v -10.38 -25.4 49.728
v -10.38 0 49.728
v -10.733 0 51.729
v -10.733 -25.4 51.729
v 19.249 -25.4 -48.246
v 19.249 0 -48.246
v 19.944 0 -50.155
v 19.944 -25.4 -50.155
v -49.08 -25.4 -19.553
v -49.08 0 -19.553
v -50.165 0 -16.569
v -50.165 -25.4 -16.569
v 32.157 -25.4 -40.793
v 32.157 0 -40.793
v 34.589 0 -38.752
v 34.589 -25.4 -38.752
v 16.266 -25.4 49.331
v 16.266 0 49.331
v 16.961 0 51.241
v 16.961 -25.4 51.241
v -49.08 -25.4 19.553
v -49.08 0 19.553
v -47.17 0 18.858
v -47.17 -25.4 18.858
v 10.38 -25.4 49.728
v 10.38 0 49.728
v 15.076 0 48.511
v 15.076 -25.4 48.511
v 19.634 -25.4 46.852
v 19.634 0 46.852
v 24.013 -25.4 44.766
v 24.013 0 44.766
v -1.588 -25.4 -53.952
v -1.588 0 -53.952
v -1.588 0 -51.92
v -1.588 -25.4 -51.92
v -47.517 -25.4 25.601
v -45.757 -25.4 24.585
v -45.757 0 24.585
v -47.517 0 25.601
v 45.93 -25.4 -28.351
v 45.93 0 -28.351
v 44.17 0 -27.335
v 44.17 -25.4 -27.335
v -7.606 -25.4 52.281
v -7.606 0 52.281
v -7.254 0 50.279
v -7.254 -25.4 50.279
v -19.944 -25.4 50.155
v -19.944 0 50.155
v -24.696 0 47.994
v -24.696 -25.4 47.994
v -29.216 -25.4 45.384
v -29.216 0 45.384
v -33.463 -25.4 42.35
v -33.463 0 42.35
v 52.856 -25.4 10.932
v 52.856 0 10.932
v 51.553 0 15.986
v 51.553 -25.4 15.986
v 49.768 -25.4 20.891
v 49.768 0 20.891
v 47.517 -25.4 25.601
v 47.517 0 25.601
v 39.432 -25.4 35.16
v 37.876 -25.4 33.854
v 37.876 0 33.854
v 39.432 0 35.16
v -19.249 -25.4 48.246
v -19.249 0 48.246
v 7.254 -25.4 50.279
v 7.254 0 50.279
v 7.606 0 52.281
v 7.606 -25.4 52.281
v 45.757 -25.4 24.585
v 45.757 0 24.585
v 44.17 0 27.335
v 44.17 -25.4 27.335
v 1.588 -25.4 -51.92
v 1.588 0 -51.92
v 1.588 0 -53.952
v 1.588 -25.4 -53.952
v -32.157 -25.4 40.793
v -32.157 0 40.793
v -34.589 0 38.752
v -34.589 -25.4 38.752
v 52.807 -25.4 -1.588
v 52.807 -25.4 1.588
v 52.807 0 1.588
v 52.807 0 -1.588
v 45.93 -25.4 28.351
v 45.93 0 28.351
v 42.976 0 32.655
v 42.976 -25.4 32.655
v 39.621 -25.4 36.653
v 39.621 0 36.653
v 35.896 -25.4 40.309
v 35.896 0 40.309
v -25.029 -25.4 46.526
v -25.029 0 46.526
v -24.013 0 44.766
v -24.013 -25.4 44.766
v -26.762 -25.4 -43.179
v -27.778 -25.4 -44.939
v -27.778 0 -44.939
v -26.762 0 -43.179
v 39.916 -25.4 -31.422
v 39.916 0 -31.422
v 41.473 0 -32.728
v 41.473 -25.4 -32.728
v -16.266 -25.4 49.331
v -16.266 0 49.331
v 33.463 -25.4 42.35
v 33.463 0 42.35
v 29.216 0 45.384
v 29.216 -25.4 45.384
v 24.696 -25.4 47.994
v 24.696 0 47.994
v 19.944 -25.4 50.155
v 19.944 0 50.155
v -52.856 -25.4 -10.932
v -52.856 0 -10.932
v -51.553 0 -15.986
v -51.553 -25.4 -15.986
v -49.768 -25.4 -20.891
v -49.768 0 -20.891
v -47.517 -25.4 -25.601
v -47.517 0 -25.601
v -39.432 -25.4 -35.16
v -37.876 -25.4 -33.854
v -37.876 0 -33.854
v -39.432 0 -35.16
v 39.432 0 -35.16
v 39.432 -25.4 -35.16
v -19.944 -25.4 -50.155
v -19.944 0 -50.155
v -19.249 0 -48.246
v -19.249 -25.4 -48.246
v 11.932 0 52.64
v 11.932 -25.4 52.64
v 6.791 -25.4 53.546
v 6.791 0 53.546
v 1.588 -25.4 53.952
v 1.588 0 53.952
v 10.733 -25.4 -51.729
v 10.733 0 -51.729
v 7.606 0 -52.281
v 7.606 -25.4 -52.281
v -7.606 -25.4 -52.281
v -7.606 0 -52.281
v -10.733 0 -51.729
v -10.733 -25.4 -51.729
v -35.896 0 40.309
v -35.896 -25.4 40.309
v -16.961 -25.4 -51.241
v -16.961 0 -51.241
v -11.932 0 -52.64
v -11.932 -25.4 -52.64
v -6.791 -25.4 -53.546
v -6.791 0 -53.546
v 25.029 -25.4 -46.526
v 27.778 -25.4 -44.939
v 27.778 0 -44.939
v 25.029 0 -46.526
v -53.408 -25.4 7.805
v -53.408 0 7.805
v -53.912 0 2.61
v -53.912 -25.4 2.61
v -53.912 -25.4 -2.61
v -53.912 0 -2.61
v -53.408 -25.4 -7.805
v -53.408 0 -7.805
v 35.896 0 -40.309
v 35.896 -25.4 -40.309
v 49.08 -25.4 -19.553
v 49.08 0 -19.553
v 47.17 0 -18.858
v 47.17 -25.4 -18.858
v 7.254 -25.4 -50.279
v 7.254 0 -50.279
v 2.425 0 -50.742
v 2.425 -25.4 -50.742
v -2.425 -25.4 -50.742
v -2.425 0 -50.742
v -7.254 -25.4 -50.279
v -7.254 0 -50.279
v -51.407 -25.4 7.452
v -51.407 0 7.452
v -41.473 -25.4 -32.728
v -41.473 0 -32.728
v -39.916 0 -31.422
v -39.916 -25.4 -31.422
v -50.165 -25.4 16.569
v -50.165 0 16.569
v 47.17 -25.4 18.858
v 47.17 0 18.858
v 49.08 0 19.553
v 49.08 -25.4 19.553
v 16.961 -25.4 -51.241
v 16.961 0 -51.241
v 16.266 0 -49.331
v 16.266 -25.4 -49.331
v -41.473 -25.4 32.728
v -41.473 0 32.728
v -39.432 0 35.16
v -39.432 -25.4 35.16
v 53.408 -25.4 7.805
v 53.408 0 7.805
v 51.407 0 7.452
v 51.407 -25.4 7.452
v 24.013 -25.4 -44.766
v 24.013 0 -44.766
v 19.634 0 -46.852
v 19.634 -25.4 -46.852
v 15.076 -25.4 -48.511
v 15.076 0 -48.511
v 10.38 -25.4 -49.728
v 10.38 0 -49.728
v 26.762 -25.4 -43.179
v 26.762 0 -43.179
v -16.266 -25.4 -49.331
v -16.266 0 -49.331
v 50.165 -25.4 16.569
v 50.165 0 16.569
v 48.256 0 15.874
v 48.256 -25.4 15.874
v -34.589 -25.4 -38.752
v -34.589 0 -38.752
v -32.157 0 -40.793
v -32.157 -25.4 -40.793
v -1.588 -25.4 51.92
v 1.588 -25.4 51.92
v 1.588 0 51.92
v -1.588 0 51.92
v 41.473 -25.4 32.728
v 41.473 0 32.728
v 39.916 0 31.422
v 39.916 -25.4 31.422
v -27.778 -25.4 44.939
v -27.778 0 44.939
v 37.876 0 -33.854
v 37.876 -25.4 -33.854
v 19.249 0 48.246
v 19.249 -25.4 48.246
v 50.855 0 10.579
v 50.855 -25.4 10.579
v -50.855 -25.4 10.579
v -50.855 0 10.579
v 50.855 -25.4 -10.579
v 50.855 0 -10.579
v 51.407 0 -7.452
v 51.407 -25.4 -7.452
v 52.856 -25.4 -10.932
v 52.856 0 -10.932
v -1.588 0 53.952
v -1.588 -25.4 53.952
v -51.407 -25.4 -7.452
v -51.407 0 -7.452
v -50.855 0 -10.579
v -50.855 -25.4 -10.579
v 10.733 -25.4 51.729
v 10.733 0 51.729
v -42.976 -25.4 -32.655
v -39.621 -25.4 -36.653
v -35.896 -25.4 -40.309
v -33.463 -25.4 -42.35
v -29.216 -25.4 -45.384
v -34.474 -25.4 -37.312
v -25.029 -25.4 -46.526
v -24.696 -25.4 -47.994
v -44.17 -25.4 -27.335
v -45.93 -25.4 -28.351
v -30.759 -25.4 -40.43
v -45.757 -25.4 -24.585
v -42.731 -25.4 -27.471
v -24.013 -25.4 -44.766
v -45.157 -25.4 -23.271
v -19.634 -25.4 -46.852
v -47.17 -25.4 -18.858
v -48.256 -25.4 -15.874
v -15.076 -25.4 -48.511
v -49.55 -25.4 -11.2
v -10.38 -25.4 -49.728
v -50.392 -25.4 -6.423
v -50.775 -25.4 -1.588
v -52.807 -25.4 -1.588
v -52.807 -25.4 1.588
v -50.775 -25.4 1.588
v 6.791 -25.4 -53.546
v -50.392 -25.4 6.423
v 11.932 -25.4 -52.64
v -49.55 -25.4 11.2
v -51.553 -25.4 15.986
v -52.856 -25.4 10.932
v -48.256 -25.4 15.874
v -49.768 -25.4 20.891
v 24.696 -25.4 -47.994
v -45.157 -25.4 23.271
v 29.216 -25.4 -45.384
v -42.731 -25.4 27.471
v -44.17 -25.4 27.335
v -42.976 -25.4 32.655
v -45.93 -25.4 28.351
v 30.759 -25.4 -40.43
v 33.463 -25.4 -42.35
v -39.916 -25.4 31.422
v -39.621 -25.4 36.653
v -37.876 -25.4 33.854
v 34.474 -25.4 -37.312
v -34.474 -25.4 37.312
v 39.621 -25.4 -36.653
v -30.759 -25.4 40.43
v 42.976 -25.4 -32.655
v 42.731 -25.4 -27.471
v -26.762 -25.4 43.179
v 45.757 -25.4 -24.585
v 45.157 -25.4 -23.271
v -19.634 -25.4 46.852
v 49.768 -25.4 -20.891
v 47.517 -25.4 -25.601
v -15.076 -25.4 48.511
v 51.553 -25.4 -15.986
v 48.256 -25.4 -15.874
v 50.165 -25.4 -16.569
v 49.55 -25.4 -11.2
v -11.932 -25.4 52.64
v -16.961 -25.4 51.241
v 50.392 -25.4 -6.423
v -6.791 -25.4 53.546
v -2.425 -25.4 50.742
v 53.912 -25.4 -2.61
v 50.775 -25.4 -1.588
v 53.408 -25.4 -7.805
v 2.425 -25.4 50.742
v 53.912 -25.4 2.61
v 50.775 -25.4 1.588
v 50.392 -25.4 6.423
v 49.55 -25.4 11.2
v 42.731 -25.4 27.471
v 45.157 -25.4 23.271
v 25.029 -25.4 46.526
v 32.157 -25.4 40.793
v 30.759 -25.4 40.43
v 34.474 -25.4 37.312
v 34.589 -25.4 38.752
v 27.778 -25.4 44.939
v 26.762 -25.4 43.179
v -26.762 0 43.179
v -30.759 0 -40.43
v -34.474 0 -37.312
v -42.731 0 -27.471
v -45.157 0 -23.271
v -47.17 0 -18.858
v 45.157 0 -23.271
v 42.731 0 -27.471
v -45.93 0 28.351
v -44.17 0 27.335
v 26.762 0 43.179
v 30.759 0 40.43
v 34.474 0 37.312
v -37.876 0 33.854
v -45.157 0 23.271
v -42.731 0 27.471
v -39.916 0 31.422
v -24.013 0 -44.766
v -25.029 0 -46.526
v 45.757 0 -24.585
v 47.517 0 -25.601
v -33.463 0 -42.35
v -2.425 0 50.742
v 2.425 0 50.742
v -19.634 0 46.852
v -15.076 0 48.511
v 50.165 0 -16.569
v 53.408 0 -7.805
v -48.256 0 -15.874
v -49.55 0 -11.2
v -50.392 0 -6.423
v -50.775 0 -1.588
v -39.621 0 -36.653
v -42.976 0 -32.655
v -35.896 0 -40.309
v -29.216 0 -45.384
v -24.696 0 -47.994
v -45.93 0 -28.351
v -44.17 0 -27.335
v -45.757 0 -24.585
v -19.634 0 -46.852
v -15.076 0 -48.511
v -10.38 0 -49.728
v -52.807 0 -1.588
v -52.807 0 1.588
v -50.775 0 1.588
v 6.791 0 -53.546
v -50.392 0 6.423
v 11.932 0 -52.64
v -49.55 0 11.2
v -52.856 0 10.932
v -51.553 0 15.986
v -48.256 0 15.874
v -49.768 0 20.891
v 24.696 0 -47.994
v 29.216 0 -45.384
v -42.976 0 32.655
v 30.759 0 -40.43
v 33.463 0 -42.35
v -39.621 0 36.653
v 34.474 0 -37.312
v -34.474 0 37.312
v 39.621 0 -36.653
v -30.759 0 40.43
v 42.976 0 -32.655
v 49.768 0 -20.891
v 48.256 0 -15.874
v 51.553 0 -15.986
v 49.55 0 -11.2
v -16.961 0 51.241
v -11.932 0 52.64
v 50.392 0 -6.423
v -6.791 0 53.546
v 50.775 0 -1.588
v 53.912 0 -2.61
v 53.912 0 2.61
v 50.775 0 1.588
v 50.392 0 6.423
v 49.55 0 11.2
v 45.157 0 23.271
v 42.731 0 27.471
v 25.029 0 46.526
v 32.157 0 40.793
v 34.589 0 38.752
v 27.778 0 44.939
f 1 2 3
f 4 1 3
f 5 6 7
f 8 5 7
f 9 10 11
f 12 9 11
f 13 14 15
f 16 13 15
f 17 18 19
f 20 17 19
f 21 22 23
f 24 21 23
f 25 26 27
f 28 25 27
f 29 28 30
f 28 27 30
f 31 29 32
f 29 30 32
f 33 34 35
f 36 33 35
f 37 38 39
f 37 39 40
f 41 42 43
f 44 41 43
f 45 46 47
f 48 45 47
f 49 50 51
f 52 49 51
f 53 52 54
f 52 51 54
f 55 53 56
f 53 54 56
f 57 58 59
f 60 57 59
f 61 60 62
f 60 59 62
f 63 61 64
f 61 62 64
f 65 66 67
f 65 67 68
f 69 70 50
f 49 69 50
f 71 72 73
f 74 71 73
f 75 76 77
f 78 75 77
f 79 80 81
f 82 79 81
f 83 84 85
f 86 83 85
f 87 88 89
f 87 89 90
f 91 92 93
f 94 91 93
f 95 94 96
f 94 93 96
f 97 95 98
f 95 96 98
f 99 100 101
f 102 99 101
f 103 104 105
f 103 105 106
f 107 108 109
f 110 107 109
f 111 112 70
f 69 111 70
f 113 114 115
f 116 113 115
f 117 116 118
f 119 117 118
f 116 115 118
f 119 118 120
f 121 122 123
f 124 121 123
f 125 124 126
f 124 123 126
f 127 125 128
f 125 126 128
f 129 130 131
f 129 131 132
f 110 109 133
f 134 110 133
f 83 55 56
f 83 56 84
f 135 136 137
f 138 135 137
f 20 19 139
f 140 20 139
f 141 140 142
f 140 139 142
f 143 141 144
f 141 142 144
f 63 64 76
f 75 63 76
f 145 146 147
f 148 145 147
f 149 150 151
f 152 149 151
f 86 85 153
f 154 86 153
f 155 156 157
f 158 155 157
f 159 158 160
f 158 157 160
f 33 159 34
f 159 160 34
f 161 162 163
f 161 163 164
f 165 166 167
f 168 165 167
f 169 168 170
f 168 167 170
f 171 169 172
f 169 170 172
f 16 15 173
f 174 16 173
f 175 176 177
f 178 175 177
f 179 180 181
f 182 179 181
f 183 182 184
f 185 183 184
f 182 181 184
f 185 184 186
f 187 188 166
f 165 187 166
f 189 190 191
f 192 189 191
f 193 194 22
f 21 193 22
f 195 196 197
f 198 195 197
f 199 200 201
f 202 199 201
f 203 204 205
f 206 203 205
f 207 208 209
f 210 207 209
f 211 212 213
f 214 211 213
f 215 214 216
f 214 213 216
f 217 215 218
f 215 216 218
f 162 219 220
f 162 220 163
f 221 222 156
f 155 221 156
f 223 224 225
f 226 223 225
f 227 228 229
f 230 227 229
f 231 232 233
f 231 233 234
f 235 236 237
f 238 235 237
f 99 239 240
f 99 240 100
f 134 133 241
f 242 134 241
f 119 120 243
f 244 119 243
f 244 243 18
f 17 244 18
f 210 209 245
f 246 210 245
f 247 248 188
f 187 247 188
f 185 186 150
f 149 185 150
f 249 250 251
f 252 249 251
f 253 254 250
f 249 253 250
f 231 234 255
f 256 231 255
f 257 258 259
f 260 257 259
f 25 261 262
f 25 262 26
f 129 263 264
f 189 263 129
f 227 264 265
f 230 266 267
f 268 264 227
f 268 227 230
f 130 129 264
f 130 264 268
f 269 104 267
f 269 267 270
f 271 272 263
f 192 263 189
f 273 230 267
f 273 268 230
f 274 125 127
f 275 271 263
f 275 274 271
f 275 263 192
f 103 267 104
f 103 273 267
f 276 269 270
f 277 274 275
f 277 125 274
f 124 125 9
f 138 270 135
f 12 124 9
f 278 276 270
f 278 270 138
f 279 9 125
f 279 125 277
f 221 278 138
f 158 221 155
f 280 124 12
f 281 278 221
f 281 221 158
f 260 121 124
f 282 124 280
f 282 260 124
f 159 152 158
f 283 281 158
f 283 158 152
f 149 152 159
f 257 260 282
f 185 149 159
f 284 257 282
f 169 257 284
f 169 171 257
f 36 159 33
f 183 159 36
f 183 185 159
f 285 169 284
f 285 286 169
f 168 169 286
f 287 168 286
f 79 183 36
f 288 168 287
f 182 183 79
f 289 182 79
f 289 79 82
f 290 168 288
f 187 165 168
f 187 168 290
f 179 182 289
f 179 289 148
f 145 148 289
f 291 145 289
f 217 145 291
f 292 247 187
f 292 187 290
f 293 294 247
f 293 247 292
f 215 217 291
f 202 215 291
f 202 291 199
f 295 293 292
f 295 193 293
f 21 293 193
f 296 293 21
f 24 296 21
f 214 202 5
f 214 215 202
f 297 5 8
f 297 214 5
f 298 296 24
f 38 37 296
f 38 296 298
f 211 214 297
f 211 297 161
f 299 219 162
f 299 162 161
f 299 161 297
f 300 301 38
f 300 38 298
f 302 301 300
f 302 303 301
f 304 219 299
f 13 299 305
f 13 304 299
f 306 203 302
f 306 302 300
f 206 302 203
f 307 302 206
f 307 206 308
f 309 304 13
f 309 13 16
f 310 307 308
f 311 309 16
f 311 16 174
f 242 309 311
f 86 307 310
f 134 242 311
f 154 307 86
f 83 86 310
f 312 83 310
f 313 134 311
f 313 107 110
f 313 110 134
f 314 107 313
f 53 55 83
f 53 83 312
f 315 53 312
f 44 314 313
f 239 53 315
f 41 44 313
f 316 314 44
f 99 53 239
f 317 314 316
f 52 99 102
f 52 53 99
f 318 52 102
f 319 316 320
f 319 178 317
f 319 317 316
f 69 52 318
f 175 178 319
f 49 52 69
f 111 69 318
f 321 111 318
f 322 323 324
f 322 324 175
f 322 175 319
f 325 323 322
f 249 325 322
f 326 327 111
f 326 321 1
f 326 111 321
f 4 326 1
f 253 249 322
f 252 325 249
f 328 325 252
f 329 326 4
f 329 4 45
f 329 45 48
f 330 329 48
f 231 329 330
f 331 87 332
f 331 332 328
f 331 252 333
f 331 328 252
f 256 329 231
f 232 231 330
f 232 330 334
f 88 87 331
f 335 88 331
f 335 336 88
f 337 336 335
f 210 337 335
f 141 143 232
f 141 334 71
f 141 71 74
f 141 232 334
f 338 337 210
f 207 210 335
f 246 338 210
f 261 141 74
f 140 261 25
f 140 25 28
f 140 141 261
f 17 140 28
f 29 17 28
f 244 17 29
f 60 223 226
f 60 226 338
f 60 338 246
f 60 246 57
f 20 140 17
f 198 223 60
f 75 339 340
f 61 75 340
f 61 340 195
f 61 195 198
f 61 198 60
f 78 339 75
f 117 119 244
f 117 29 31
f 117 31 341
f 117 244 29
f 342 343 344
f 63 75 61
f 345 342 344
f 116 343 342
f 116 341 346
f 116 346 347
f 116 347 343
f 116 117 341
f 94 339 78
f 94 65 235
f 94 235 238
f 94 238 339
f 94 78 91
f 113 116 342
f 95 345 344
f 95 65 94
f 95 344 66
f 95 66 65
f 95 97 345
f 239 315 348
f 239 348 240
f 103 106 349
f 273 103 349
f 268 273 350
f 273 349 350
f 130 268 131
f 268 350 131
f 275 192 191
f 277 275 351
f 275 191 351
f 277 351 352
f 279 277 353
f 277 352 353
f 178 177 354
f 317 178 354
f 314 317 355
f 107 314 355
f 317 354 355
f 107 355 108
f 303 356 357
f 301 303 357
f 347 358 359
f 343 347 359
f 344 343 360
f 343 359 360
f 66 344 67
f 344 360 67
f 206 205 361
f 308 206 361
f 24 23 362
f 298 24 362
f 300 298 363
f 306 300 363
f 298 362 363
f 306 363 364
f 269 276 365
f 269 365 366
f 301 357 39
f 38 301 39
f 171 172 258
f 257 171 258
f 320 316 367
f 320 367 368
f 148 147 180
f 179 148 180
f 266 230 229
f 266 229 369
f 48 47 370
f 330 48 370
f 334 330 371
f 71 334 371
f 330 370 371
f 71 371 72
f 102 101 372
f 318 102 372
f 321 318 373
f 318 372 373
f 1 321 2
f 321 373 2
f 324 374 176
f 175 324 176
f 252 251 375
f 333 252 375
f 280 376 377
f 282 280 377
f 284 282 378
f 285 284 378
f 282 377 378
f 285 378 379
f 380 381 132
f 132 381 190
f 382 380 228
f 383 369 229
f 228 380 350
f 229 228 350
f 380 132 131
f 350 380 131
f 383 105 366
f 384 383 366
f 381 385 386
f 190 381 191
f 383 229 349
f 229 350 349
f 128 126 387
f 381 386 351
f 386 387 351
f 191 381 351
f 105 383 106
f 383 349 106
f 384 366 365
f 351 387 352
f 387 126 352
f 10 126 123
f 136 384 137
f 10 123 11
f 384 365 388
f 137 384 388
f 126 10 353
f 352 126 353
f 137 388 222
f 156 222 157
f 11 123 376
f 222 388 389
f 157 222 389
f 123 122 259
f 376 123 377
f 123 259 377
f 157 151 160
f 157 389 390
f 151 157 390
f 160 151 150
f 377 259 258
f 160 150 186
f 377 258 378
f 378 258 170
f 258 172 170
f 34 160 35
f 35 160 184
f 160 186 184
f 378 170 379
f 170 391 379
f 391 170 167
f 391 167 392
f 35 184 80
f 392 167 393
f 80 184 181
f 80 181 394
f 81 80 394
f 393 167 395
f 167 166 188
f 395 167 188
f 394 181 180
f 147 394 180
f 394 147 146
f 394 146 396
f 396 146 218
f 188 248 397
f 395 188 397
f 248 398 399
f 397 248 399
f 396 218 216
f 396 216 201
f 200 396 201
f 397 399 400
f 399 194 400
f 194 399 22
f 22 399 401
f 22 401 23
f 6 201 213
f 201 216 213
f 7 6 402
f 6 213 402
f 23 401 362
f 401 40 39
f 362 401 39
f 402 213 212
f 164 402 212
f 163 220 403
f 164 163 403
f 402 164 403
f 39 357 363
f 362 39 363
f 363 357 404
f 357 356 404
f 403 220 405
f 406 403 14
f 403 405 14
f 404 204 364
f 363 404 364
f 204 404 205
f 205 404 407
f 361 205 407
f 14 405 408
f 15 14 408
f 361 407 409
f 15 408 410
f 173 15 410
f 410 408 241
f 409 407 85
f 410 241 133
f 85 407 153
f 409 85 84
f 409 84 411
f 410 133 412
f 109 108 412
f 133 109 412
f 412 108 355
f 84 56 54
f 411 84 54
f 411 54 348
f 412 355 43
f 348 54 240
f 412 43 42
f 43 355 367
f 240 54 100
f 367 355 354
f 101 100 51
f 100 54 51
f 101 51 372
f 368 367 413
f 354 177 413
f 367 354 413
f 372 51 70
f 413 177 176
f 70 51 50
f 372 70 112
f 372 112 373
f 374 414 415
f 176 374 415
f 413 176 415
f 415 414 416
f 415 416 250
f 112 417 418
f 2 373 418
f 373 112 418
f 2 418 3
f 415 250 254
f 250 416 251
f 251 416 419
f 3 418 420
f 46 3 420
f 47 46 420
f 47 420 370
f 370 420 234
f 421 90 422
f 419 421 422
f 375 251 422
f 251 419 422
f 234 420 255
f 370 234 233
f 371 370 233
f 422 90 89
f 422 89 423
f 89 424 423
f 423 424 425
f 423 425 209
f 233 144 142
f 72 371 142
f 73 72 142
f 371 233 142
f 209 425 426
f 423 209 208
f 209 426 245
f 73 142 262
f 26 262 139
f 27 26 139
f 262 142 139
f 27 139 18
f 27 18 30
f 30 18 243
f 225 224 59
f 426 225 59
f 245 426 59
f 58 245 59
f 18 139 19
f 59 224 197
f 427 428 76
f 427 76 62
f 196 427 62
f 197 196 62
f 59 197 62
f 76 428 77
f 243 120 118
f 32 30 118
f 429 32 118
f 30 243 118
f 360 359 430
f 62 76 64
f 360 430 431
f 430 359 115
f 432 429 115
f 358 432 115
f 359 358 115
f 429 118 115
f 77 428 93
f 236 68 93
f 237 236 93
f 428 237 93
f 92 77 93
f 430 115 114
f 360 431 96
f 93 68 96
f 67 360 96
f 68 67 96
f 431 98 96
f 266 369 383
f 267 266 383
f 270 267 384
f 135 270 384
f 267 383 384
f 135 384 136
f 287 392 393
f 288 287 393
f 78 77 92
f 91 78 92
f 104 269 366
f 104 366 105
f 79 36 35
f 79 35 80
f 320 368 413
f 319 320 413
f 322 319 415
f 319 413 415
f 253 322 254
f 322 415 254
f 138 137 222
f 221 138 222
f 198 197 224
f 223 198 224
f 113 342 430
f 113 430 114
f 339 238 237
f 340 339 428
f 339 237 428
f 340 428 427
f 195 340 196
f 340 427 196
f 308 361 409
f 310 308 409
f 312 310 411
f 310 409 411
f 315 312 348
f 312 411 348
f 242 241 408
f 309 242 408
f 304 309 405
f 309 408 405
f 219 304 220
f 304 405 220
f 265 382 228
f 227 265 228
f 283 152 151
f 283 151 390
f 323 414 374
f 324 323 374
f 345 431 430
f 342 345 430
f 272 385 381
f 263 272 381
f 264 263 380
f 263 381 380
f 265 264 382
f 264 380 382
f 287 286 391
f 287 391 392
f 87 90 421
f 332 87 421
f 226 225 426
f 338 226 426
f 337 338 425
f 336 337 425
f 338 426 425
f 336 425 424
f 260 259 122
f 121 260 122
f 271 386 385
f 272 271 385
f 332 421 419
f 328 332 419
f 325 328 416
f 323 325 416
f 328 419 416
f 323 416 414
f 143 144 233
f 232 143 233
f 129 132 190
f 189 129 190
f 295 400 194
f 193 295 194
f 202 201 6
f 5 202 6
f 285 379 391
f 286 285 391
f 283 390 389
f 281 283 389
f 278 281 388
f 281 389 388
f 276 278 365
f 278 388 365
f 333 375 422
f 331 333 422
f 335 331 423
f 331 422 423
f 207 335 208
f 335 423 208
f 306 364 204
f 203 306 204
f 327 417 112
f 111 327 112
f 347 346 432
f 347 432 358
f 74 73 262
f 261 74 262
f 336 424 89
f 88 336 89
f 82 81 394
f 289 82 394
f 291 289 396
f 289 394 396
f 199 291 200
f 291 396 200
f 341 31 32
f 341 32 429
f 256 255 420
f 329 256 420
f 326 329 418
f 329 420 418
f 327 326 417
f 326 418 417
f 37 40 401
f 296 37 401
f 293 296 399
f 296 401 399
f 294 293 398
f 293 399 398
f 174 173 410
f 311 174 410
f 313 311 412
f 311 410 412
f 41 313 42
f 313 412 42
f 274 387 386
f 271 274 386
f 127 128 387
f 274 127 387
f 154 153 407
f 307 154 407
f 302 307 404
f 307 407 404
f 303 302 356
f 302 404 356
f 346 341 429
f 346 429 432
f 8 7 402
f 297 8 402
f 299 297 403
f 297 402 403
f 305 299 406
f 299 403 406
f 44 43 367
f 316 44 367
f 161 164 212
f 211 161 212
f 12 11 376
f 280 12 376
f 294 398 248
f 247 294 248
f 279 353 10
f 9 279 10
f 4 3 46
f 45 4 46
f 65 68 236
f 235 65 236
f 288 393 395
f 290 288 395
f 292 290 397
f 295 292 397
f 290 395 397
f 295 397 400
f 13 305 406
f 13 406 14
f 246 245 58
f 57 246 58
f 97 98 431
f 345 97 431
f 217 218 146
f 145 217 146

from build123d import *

# Parameters (mm, degrees)
F1_DEPTH = 25.4


with BuildPart() as f1:
    # F0 (on Front) → F1 (new body)
    with BuildSketch(Plane.XZ):
        with BuildLine():
            Line((-1.5875, 51.919649), (-1.5875, 53.951649))
            ThreePointArc((-1.5875, 53.951649), (-9.37266, 53.154998), (-16.960789, 51.240924))
            Line((-16.960789, 51.240924), (-16.265804, 49.331468))
            Line((-16.265804, 49.331468), (-19.249328, 48.245554))
            Line((-19.249328, 48.245554), (-19.944313, 50.15501))
            ThreePointArc((-19.944313, 50.15501), (-26.9875, 46.743721), (-33.463356, 42.349787))
            Line((-33.463356, 42.349787), (-32.157212, 40.793184))
            Line((-32.157212, 40.793184), (-34.589403, 38.752334))
            Line((-34.589403, 38.752334), (-35.895547, 40.308936))
            ThreePointArc((-35.895547, 40.308936), (-41.347249, 34.694461), (-45.929749, 28.35064))
            Line((-45.929749, 28.35064), (-44.169985, 27.33464))
            Line((-44.169985, 27.33464), (-45.757485, 24.585009))
            Line((-45.757485, 24.585009), (-47.517249, 25.601009))
            ThreePointArc((-47.517249, 25.601009), (-50.719909, 18.460537), (-52.856336, 10.931988))
            Line((-52.856336, 10.931988), (-50.855207, 10.579135))
            Line((-50.855207, 10.579135), (-51.40654, 7.45237))
            Line((-51.40654, 7.45237), (-53.407669, 7.805223))
            ThreePointArc((-53.407669, 7.805223), (-53.975, 0), (-53.407669, -7.805223))
            Line((-53.407669, -7.805223), (-51.40654, -7.45237))
            Line((-51.40654, -7.45237), (-50.855207, -10.579135))
            Line((-50.855207, -10.579135), (-52.856336, -10.931988))
            ThreePointArc((-52.856336, -10.931988), (-50.719909, -18.460537), (-47.517249, -25.601009))
            Line((-47.517249, -25.601009), (-45.757485, -24.585009))
            Line((-45.757485, -24.585009), (-44.169985, -27.33464))
            Line((-44.169985, -27.33464), (-45.929749, -28.35064))
            ThreePointArc((-45.929749, -28.35064), (-41.347249, -34.694461), (-35.895547, -40.308936))
            Line((-35.895547, -40.308936), (-34.589403, -38.752334))
            Line((-34.589403, -38.752334), (-32.157212, -40.793184))
            Line((-32.157212, -40.793184), (-33.463356, -42.349787))
            ThreePointArc((-33.463356, -42.349787), (-26.9875, -46.743721), (-19.944313, -50.15501))
            Line((-19.944313, -50.15501), (-19.249328, -48.245554))
            Line((-19.249328, -48.245554), (-16.265804, -49.331468))
            Line((-16.265804, -49.331468), (-16.960789, -51.240924))
            ThreePointArc((-16.960789, -51.240924), (-9.37266, -53.154998), (-1.5875, -53.951649))
            Line((-1.5875, -53.951649), (-1.5875, -51.919649))
            Line((-1.5875, -51.919649), (1.5875, -51.919649))
            Line((1.5875, -51.919649), (1.5875, -53.951649))
            ThreePointArc((1.5875, -53.951649), (9.37266, -53.154998), (16.960789, -51.240924))
            Line((16.960789, -51.240924), (16.265804, -49.331468))
            Line((16.265804, -49.331468), (19.249328, -48.245554))
            Line((19.249328, -48.245554), (19.944313, -50.15501))
            ThreePointArc((19.944313, -50.15501), (26.9875, -46.743721), (33.463356, -42.349787))
            Line((33.463356, -42.349787), (32.157212, -40.793184))
            Line((32.157212, -40.793184), (34.589403, -38.752334))
            Line((34.589403, -38.752334), (35.895547, -40.308936))
            ThreePointArc((35.895547, -40.308936), (41.347249, -34.694461), (45.929749, -28.35064))
            Line((45.929749, -28.35064), (44.169985, -27.33464))
            Line((44.169985, -27.33464), (45.757485, -24.585009))
            Line((45.757485, -24.585009), (47.517249, -25.601009))
            ThreePointArc((47.517249, -25.601009), (50.719909, -18.460537), (52.856336, -10.931988))
            Line((52.856336, -10.931988), (50.855207, -10.579135))
            Line((50.855207, -10.579135), (51.40654, -7.45237))
            Line((51.40654, -7.45237), (53.407669, -7.805223))
            ThreePointArc((53.407669, -7.805223), (53.975, 0), (53.407669, 7.805223))
            Line((53.407669, 7.805223), (51.40654, 7.45237))
            Line((51.40654, 7.45237), (50.855207, 10.579135))
            Line((50.855207, 10.579135), (52.856336, 10.931988))
            ThreePointArc((52.856336, 10.931988), (50.719909, 18.460537), (47.517249, 25.601009))
            Line((47.517249, 25.601009), (45.757485, 24.585009))
            Line((45.757485, 24.585009), (44.169985, 27.33464))
            Line((44.169985, 27.33464), (45.929749, 28.35064))
            ThreePointArc((45.929749, 28.35064), (41.347249, 34.694461), (35.895547, 40.308936))
            Line((35.895547, 40.308936), (34.589403, 38.752334))
            Line((34.589403, 38.752334), (32.157212, 40.793184))
            Line((32.157212, 40.793184), (33.463356, 42.349787))
            ThreePointArc((33.463356, 42.349787), (26.9875, 46.743721), (19.944313, 50.15501))
            Line((19.944313, 50.15501), (19.249328, 48.245554))
            Line((19.249328, 48.245554), (16.265804, 49.331468))
            Line((16.265804, 49.331468), (16.960789, 51.240924))
            ThreePointArc((16.960789, 51.240924), (9.37266, 53.154998), (1.5875, 53.951649))
            Line((1.5875, 53.951649), (1.5875, 51.919649))
            Line((1.5875, 51.919649), (-1.5875, 51.919649))
        make_face()
        with BuildLine():
            ThreePointArc((-48.256028, -15.874375), (-50.028234, -8.821327), (-50.775189, -1.5875))
            Line((-50.775189, -1.5875), (-52.807189, -1.5875))
            Line((-52.807189, -1.5875), (-52.807189, 1.5875))
            Line((-52.807189, 1.5875), (-50.775189, 1.5875))
            ThreePointArc((-50.775189, 1.5875), (-50.028234, 8.821327), (-48.256028, 15.874375))
            Line((-48.256028, 15.874375), (-50.165483, 16.56936))
            Line((-50.165483, 16.56936), (-49.079569, 19.552884))
            Line((-49.079569, 19.552884), (-47.170114, 18.8579))
            ThreePointArc((-47.170114, 18.8579), (-43.994091, 25.4), (-39.916477, 31.421567))
            Line((-39.916477, 31.421567), (-41.473079, 32.727711))
            Line((-41.473079, 32.727711), (-39.432229, 35.159903))
            Line((-39.432229, 35.159903), (-37.875626, 33.853758))
            ThreePointArc((-37.875626, 33.853758), (-32.653611, 38.915058), (-26.76241, 43.178854))
            Line((-26.76241, 43.178854), (-27.77841, 44.938617))
            Line((-27.77841, 44.938617), (-25.028779, 46.526117))
            Line((-25.028779, 46.526117), (-24.012779, 44.766354))
            ThreePointArc((-24.012779, 44.766354), (-17.374623, 47.736385), (-10.380401, 49.728134))
            Line((-10.380401, 49.728134), (-10.733254, 51.729263))
            Line((-10.733254, 51.729263), (-7.60649, 52.280596))
            Line((-7.60649, 52.280596), (-7.253637, 50.279467))
            ThreePointArc((-7.253637, 50.279467), (0, 50.8), (7.253637, 50.279467))
            Line((7.253637, 50.279467), (7.60649, 52.280596))
            Line((7.60649, 52.280596), (10.733254, 51.729263))
            Line((10.733254, 51.729263), (10.380401, 49.728134))
            ThreePointArc((10.380401, 49.728134), (17.374623, 47.736385), (24.012779, 44.766354))
            Line((24.012779, 44.766354), (25.028779, 46.526117))
            Line((25.028779, 46.526117), (27.77841, 44.938617))
            Line((27.77841, 44.938617), (26.76241, 43.178854))
            ThreePointArc((26.76241, 43.178854), (32.653611, 38.915058), (37.875626, 33.853758))
            Line((37.875626, 33.853758), (39.432229, 35.159903))
            Line((39.432229, 35.159903), (41.473079, 32.727711))
            Line((41.473079, 32.727711), (39.916477, 31.421567))
            ThreePointArc((39.916477, 31.421567), (43.994091, 25.4), (47.170114, 18.8579))
            Line((47.170114, 18.8579), (49.079569, 19.552884))
            Line((49.079569, 19.552884), (50.165483, 16.56936))
            Line((50.165483, 16.56936), (48.256028, 15.874375))
            ThreePointArc((48.256028, 15.874375), (50.028234, 8.821327), (50.775189, 1.5875))
            Line((50.775189, 1.5875), (52.807189, 1.5875))
            Line((52.807189, 1.5875), (52.807189, -1.5875))
            Line((52.807189, -1.5875), (50.775189, -1.5875))
            ThreePointArc((50.775189, -1.5875), (50.028234, -8.821327), (48.256028, -15.874375))
            Line((48.256028, -15.874375), (50.165483, -16.56936))
            Line((50.165483, -16.56936), (49.079569, -19.552884))
            Line((49.079569, -19.552884), (47.170114, -18.8579))
            ThreePointArc((47.170114, -18.8579), (43.994091, -25.4), (39.916477, -31.421567))
            Line((39.916477, -31.421567), (41.473079, -32.727711))
            Line((41.473079, -32.727711), (39.432229, -35.159903))
            Line((39.432229, -35.159903), (37.875626, -33.853758))
            ThreePointArc((37.875626, -33.853758), (32.653611, -38.915058), (26.76241, -43.178854))
            Line((26.76241, -43.178854), (27.77841, -44.938617))
            Line((27.77841, -44.938617), (25.028779, -46.526117))
            Line((25.028779, -46.526117), (24.012779, -44.766354))
            ThreePointArc((24.012779, -44.766354), (17.374623, -47.736385), (10.380401, -49.728134))
            Line((10.380401, -49.728134), (10.733254, -51.729263))
            Line((10.733254, -51.729263), (7.60649, -52.280596))
            Line((7.60649, -52.280596), (7.253637, -50.279467))
            ThreePointArc((7.253637, -50.279467), (0, -50.8), (-7.253637, -50.279467))
            Line((-7.253637, -50.279467), (-7.60649, -52.280596))
            Line((-7.60649, -52.280596), (-10.733254, -51.729263))
            Line((-10.733254, -51.729263), (-10.380401, -49.728134))
            ThreePointArc((-10.380401, -49.728134), (-17.374623, -47.736385), (-24.012779, -44.766354))
            Line((-24.012779, -44.766354), (-25.028779, -46.526117))
            Line((-25.028779, -46.526117), (-27.77841, -44.938617))
            Line((-27.77841, -44.938617), (-26.76241, -43.178854))
            ThreePointArc((-26.76241, -43.178854), (-32.653611, -38.915058), (-37.875626, -33.853758))
            Line((-37.875626, -33.853758), (-39.432229, -35.159903))
            Line((-39.432229, -35.159903), (-41.473079, -32.727711))
            Line((-41.473079, -32.727711), (-39.916477, -31.421567))
            ThreePointArc((-39.916477, -31.421567), (-43.994091, -25.4), (-47.170114, -18.8579))
            Line((-47.170114, -18.8579), (-49.079569, -19.552884))
            Line((-49.079569, -19.552884), (-50.165483, -16.56936))
            Line((-50.165483, -16.56936), (-48.256028, -15.874375))
        make_face(mode=Mode.SUBTRACT)
    extrude(amount=F1_DEPTH)


solid = f1.part
